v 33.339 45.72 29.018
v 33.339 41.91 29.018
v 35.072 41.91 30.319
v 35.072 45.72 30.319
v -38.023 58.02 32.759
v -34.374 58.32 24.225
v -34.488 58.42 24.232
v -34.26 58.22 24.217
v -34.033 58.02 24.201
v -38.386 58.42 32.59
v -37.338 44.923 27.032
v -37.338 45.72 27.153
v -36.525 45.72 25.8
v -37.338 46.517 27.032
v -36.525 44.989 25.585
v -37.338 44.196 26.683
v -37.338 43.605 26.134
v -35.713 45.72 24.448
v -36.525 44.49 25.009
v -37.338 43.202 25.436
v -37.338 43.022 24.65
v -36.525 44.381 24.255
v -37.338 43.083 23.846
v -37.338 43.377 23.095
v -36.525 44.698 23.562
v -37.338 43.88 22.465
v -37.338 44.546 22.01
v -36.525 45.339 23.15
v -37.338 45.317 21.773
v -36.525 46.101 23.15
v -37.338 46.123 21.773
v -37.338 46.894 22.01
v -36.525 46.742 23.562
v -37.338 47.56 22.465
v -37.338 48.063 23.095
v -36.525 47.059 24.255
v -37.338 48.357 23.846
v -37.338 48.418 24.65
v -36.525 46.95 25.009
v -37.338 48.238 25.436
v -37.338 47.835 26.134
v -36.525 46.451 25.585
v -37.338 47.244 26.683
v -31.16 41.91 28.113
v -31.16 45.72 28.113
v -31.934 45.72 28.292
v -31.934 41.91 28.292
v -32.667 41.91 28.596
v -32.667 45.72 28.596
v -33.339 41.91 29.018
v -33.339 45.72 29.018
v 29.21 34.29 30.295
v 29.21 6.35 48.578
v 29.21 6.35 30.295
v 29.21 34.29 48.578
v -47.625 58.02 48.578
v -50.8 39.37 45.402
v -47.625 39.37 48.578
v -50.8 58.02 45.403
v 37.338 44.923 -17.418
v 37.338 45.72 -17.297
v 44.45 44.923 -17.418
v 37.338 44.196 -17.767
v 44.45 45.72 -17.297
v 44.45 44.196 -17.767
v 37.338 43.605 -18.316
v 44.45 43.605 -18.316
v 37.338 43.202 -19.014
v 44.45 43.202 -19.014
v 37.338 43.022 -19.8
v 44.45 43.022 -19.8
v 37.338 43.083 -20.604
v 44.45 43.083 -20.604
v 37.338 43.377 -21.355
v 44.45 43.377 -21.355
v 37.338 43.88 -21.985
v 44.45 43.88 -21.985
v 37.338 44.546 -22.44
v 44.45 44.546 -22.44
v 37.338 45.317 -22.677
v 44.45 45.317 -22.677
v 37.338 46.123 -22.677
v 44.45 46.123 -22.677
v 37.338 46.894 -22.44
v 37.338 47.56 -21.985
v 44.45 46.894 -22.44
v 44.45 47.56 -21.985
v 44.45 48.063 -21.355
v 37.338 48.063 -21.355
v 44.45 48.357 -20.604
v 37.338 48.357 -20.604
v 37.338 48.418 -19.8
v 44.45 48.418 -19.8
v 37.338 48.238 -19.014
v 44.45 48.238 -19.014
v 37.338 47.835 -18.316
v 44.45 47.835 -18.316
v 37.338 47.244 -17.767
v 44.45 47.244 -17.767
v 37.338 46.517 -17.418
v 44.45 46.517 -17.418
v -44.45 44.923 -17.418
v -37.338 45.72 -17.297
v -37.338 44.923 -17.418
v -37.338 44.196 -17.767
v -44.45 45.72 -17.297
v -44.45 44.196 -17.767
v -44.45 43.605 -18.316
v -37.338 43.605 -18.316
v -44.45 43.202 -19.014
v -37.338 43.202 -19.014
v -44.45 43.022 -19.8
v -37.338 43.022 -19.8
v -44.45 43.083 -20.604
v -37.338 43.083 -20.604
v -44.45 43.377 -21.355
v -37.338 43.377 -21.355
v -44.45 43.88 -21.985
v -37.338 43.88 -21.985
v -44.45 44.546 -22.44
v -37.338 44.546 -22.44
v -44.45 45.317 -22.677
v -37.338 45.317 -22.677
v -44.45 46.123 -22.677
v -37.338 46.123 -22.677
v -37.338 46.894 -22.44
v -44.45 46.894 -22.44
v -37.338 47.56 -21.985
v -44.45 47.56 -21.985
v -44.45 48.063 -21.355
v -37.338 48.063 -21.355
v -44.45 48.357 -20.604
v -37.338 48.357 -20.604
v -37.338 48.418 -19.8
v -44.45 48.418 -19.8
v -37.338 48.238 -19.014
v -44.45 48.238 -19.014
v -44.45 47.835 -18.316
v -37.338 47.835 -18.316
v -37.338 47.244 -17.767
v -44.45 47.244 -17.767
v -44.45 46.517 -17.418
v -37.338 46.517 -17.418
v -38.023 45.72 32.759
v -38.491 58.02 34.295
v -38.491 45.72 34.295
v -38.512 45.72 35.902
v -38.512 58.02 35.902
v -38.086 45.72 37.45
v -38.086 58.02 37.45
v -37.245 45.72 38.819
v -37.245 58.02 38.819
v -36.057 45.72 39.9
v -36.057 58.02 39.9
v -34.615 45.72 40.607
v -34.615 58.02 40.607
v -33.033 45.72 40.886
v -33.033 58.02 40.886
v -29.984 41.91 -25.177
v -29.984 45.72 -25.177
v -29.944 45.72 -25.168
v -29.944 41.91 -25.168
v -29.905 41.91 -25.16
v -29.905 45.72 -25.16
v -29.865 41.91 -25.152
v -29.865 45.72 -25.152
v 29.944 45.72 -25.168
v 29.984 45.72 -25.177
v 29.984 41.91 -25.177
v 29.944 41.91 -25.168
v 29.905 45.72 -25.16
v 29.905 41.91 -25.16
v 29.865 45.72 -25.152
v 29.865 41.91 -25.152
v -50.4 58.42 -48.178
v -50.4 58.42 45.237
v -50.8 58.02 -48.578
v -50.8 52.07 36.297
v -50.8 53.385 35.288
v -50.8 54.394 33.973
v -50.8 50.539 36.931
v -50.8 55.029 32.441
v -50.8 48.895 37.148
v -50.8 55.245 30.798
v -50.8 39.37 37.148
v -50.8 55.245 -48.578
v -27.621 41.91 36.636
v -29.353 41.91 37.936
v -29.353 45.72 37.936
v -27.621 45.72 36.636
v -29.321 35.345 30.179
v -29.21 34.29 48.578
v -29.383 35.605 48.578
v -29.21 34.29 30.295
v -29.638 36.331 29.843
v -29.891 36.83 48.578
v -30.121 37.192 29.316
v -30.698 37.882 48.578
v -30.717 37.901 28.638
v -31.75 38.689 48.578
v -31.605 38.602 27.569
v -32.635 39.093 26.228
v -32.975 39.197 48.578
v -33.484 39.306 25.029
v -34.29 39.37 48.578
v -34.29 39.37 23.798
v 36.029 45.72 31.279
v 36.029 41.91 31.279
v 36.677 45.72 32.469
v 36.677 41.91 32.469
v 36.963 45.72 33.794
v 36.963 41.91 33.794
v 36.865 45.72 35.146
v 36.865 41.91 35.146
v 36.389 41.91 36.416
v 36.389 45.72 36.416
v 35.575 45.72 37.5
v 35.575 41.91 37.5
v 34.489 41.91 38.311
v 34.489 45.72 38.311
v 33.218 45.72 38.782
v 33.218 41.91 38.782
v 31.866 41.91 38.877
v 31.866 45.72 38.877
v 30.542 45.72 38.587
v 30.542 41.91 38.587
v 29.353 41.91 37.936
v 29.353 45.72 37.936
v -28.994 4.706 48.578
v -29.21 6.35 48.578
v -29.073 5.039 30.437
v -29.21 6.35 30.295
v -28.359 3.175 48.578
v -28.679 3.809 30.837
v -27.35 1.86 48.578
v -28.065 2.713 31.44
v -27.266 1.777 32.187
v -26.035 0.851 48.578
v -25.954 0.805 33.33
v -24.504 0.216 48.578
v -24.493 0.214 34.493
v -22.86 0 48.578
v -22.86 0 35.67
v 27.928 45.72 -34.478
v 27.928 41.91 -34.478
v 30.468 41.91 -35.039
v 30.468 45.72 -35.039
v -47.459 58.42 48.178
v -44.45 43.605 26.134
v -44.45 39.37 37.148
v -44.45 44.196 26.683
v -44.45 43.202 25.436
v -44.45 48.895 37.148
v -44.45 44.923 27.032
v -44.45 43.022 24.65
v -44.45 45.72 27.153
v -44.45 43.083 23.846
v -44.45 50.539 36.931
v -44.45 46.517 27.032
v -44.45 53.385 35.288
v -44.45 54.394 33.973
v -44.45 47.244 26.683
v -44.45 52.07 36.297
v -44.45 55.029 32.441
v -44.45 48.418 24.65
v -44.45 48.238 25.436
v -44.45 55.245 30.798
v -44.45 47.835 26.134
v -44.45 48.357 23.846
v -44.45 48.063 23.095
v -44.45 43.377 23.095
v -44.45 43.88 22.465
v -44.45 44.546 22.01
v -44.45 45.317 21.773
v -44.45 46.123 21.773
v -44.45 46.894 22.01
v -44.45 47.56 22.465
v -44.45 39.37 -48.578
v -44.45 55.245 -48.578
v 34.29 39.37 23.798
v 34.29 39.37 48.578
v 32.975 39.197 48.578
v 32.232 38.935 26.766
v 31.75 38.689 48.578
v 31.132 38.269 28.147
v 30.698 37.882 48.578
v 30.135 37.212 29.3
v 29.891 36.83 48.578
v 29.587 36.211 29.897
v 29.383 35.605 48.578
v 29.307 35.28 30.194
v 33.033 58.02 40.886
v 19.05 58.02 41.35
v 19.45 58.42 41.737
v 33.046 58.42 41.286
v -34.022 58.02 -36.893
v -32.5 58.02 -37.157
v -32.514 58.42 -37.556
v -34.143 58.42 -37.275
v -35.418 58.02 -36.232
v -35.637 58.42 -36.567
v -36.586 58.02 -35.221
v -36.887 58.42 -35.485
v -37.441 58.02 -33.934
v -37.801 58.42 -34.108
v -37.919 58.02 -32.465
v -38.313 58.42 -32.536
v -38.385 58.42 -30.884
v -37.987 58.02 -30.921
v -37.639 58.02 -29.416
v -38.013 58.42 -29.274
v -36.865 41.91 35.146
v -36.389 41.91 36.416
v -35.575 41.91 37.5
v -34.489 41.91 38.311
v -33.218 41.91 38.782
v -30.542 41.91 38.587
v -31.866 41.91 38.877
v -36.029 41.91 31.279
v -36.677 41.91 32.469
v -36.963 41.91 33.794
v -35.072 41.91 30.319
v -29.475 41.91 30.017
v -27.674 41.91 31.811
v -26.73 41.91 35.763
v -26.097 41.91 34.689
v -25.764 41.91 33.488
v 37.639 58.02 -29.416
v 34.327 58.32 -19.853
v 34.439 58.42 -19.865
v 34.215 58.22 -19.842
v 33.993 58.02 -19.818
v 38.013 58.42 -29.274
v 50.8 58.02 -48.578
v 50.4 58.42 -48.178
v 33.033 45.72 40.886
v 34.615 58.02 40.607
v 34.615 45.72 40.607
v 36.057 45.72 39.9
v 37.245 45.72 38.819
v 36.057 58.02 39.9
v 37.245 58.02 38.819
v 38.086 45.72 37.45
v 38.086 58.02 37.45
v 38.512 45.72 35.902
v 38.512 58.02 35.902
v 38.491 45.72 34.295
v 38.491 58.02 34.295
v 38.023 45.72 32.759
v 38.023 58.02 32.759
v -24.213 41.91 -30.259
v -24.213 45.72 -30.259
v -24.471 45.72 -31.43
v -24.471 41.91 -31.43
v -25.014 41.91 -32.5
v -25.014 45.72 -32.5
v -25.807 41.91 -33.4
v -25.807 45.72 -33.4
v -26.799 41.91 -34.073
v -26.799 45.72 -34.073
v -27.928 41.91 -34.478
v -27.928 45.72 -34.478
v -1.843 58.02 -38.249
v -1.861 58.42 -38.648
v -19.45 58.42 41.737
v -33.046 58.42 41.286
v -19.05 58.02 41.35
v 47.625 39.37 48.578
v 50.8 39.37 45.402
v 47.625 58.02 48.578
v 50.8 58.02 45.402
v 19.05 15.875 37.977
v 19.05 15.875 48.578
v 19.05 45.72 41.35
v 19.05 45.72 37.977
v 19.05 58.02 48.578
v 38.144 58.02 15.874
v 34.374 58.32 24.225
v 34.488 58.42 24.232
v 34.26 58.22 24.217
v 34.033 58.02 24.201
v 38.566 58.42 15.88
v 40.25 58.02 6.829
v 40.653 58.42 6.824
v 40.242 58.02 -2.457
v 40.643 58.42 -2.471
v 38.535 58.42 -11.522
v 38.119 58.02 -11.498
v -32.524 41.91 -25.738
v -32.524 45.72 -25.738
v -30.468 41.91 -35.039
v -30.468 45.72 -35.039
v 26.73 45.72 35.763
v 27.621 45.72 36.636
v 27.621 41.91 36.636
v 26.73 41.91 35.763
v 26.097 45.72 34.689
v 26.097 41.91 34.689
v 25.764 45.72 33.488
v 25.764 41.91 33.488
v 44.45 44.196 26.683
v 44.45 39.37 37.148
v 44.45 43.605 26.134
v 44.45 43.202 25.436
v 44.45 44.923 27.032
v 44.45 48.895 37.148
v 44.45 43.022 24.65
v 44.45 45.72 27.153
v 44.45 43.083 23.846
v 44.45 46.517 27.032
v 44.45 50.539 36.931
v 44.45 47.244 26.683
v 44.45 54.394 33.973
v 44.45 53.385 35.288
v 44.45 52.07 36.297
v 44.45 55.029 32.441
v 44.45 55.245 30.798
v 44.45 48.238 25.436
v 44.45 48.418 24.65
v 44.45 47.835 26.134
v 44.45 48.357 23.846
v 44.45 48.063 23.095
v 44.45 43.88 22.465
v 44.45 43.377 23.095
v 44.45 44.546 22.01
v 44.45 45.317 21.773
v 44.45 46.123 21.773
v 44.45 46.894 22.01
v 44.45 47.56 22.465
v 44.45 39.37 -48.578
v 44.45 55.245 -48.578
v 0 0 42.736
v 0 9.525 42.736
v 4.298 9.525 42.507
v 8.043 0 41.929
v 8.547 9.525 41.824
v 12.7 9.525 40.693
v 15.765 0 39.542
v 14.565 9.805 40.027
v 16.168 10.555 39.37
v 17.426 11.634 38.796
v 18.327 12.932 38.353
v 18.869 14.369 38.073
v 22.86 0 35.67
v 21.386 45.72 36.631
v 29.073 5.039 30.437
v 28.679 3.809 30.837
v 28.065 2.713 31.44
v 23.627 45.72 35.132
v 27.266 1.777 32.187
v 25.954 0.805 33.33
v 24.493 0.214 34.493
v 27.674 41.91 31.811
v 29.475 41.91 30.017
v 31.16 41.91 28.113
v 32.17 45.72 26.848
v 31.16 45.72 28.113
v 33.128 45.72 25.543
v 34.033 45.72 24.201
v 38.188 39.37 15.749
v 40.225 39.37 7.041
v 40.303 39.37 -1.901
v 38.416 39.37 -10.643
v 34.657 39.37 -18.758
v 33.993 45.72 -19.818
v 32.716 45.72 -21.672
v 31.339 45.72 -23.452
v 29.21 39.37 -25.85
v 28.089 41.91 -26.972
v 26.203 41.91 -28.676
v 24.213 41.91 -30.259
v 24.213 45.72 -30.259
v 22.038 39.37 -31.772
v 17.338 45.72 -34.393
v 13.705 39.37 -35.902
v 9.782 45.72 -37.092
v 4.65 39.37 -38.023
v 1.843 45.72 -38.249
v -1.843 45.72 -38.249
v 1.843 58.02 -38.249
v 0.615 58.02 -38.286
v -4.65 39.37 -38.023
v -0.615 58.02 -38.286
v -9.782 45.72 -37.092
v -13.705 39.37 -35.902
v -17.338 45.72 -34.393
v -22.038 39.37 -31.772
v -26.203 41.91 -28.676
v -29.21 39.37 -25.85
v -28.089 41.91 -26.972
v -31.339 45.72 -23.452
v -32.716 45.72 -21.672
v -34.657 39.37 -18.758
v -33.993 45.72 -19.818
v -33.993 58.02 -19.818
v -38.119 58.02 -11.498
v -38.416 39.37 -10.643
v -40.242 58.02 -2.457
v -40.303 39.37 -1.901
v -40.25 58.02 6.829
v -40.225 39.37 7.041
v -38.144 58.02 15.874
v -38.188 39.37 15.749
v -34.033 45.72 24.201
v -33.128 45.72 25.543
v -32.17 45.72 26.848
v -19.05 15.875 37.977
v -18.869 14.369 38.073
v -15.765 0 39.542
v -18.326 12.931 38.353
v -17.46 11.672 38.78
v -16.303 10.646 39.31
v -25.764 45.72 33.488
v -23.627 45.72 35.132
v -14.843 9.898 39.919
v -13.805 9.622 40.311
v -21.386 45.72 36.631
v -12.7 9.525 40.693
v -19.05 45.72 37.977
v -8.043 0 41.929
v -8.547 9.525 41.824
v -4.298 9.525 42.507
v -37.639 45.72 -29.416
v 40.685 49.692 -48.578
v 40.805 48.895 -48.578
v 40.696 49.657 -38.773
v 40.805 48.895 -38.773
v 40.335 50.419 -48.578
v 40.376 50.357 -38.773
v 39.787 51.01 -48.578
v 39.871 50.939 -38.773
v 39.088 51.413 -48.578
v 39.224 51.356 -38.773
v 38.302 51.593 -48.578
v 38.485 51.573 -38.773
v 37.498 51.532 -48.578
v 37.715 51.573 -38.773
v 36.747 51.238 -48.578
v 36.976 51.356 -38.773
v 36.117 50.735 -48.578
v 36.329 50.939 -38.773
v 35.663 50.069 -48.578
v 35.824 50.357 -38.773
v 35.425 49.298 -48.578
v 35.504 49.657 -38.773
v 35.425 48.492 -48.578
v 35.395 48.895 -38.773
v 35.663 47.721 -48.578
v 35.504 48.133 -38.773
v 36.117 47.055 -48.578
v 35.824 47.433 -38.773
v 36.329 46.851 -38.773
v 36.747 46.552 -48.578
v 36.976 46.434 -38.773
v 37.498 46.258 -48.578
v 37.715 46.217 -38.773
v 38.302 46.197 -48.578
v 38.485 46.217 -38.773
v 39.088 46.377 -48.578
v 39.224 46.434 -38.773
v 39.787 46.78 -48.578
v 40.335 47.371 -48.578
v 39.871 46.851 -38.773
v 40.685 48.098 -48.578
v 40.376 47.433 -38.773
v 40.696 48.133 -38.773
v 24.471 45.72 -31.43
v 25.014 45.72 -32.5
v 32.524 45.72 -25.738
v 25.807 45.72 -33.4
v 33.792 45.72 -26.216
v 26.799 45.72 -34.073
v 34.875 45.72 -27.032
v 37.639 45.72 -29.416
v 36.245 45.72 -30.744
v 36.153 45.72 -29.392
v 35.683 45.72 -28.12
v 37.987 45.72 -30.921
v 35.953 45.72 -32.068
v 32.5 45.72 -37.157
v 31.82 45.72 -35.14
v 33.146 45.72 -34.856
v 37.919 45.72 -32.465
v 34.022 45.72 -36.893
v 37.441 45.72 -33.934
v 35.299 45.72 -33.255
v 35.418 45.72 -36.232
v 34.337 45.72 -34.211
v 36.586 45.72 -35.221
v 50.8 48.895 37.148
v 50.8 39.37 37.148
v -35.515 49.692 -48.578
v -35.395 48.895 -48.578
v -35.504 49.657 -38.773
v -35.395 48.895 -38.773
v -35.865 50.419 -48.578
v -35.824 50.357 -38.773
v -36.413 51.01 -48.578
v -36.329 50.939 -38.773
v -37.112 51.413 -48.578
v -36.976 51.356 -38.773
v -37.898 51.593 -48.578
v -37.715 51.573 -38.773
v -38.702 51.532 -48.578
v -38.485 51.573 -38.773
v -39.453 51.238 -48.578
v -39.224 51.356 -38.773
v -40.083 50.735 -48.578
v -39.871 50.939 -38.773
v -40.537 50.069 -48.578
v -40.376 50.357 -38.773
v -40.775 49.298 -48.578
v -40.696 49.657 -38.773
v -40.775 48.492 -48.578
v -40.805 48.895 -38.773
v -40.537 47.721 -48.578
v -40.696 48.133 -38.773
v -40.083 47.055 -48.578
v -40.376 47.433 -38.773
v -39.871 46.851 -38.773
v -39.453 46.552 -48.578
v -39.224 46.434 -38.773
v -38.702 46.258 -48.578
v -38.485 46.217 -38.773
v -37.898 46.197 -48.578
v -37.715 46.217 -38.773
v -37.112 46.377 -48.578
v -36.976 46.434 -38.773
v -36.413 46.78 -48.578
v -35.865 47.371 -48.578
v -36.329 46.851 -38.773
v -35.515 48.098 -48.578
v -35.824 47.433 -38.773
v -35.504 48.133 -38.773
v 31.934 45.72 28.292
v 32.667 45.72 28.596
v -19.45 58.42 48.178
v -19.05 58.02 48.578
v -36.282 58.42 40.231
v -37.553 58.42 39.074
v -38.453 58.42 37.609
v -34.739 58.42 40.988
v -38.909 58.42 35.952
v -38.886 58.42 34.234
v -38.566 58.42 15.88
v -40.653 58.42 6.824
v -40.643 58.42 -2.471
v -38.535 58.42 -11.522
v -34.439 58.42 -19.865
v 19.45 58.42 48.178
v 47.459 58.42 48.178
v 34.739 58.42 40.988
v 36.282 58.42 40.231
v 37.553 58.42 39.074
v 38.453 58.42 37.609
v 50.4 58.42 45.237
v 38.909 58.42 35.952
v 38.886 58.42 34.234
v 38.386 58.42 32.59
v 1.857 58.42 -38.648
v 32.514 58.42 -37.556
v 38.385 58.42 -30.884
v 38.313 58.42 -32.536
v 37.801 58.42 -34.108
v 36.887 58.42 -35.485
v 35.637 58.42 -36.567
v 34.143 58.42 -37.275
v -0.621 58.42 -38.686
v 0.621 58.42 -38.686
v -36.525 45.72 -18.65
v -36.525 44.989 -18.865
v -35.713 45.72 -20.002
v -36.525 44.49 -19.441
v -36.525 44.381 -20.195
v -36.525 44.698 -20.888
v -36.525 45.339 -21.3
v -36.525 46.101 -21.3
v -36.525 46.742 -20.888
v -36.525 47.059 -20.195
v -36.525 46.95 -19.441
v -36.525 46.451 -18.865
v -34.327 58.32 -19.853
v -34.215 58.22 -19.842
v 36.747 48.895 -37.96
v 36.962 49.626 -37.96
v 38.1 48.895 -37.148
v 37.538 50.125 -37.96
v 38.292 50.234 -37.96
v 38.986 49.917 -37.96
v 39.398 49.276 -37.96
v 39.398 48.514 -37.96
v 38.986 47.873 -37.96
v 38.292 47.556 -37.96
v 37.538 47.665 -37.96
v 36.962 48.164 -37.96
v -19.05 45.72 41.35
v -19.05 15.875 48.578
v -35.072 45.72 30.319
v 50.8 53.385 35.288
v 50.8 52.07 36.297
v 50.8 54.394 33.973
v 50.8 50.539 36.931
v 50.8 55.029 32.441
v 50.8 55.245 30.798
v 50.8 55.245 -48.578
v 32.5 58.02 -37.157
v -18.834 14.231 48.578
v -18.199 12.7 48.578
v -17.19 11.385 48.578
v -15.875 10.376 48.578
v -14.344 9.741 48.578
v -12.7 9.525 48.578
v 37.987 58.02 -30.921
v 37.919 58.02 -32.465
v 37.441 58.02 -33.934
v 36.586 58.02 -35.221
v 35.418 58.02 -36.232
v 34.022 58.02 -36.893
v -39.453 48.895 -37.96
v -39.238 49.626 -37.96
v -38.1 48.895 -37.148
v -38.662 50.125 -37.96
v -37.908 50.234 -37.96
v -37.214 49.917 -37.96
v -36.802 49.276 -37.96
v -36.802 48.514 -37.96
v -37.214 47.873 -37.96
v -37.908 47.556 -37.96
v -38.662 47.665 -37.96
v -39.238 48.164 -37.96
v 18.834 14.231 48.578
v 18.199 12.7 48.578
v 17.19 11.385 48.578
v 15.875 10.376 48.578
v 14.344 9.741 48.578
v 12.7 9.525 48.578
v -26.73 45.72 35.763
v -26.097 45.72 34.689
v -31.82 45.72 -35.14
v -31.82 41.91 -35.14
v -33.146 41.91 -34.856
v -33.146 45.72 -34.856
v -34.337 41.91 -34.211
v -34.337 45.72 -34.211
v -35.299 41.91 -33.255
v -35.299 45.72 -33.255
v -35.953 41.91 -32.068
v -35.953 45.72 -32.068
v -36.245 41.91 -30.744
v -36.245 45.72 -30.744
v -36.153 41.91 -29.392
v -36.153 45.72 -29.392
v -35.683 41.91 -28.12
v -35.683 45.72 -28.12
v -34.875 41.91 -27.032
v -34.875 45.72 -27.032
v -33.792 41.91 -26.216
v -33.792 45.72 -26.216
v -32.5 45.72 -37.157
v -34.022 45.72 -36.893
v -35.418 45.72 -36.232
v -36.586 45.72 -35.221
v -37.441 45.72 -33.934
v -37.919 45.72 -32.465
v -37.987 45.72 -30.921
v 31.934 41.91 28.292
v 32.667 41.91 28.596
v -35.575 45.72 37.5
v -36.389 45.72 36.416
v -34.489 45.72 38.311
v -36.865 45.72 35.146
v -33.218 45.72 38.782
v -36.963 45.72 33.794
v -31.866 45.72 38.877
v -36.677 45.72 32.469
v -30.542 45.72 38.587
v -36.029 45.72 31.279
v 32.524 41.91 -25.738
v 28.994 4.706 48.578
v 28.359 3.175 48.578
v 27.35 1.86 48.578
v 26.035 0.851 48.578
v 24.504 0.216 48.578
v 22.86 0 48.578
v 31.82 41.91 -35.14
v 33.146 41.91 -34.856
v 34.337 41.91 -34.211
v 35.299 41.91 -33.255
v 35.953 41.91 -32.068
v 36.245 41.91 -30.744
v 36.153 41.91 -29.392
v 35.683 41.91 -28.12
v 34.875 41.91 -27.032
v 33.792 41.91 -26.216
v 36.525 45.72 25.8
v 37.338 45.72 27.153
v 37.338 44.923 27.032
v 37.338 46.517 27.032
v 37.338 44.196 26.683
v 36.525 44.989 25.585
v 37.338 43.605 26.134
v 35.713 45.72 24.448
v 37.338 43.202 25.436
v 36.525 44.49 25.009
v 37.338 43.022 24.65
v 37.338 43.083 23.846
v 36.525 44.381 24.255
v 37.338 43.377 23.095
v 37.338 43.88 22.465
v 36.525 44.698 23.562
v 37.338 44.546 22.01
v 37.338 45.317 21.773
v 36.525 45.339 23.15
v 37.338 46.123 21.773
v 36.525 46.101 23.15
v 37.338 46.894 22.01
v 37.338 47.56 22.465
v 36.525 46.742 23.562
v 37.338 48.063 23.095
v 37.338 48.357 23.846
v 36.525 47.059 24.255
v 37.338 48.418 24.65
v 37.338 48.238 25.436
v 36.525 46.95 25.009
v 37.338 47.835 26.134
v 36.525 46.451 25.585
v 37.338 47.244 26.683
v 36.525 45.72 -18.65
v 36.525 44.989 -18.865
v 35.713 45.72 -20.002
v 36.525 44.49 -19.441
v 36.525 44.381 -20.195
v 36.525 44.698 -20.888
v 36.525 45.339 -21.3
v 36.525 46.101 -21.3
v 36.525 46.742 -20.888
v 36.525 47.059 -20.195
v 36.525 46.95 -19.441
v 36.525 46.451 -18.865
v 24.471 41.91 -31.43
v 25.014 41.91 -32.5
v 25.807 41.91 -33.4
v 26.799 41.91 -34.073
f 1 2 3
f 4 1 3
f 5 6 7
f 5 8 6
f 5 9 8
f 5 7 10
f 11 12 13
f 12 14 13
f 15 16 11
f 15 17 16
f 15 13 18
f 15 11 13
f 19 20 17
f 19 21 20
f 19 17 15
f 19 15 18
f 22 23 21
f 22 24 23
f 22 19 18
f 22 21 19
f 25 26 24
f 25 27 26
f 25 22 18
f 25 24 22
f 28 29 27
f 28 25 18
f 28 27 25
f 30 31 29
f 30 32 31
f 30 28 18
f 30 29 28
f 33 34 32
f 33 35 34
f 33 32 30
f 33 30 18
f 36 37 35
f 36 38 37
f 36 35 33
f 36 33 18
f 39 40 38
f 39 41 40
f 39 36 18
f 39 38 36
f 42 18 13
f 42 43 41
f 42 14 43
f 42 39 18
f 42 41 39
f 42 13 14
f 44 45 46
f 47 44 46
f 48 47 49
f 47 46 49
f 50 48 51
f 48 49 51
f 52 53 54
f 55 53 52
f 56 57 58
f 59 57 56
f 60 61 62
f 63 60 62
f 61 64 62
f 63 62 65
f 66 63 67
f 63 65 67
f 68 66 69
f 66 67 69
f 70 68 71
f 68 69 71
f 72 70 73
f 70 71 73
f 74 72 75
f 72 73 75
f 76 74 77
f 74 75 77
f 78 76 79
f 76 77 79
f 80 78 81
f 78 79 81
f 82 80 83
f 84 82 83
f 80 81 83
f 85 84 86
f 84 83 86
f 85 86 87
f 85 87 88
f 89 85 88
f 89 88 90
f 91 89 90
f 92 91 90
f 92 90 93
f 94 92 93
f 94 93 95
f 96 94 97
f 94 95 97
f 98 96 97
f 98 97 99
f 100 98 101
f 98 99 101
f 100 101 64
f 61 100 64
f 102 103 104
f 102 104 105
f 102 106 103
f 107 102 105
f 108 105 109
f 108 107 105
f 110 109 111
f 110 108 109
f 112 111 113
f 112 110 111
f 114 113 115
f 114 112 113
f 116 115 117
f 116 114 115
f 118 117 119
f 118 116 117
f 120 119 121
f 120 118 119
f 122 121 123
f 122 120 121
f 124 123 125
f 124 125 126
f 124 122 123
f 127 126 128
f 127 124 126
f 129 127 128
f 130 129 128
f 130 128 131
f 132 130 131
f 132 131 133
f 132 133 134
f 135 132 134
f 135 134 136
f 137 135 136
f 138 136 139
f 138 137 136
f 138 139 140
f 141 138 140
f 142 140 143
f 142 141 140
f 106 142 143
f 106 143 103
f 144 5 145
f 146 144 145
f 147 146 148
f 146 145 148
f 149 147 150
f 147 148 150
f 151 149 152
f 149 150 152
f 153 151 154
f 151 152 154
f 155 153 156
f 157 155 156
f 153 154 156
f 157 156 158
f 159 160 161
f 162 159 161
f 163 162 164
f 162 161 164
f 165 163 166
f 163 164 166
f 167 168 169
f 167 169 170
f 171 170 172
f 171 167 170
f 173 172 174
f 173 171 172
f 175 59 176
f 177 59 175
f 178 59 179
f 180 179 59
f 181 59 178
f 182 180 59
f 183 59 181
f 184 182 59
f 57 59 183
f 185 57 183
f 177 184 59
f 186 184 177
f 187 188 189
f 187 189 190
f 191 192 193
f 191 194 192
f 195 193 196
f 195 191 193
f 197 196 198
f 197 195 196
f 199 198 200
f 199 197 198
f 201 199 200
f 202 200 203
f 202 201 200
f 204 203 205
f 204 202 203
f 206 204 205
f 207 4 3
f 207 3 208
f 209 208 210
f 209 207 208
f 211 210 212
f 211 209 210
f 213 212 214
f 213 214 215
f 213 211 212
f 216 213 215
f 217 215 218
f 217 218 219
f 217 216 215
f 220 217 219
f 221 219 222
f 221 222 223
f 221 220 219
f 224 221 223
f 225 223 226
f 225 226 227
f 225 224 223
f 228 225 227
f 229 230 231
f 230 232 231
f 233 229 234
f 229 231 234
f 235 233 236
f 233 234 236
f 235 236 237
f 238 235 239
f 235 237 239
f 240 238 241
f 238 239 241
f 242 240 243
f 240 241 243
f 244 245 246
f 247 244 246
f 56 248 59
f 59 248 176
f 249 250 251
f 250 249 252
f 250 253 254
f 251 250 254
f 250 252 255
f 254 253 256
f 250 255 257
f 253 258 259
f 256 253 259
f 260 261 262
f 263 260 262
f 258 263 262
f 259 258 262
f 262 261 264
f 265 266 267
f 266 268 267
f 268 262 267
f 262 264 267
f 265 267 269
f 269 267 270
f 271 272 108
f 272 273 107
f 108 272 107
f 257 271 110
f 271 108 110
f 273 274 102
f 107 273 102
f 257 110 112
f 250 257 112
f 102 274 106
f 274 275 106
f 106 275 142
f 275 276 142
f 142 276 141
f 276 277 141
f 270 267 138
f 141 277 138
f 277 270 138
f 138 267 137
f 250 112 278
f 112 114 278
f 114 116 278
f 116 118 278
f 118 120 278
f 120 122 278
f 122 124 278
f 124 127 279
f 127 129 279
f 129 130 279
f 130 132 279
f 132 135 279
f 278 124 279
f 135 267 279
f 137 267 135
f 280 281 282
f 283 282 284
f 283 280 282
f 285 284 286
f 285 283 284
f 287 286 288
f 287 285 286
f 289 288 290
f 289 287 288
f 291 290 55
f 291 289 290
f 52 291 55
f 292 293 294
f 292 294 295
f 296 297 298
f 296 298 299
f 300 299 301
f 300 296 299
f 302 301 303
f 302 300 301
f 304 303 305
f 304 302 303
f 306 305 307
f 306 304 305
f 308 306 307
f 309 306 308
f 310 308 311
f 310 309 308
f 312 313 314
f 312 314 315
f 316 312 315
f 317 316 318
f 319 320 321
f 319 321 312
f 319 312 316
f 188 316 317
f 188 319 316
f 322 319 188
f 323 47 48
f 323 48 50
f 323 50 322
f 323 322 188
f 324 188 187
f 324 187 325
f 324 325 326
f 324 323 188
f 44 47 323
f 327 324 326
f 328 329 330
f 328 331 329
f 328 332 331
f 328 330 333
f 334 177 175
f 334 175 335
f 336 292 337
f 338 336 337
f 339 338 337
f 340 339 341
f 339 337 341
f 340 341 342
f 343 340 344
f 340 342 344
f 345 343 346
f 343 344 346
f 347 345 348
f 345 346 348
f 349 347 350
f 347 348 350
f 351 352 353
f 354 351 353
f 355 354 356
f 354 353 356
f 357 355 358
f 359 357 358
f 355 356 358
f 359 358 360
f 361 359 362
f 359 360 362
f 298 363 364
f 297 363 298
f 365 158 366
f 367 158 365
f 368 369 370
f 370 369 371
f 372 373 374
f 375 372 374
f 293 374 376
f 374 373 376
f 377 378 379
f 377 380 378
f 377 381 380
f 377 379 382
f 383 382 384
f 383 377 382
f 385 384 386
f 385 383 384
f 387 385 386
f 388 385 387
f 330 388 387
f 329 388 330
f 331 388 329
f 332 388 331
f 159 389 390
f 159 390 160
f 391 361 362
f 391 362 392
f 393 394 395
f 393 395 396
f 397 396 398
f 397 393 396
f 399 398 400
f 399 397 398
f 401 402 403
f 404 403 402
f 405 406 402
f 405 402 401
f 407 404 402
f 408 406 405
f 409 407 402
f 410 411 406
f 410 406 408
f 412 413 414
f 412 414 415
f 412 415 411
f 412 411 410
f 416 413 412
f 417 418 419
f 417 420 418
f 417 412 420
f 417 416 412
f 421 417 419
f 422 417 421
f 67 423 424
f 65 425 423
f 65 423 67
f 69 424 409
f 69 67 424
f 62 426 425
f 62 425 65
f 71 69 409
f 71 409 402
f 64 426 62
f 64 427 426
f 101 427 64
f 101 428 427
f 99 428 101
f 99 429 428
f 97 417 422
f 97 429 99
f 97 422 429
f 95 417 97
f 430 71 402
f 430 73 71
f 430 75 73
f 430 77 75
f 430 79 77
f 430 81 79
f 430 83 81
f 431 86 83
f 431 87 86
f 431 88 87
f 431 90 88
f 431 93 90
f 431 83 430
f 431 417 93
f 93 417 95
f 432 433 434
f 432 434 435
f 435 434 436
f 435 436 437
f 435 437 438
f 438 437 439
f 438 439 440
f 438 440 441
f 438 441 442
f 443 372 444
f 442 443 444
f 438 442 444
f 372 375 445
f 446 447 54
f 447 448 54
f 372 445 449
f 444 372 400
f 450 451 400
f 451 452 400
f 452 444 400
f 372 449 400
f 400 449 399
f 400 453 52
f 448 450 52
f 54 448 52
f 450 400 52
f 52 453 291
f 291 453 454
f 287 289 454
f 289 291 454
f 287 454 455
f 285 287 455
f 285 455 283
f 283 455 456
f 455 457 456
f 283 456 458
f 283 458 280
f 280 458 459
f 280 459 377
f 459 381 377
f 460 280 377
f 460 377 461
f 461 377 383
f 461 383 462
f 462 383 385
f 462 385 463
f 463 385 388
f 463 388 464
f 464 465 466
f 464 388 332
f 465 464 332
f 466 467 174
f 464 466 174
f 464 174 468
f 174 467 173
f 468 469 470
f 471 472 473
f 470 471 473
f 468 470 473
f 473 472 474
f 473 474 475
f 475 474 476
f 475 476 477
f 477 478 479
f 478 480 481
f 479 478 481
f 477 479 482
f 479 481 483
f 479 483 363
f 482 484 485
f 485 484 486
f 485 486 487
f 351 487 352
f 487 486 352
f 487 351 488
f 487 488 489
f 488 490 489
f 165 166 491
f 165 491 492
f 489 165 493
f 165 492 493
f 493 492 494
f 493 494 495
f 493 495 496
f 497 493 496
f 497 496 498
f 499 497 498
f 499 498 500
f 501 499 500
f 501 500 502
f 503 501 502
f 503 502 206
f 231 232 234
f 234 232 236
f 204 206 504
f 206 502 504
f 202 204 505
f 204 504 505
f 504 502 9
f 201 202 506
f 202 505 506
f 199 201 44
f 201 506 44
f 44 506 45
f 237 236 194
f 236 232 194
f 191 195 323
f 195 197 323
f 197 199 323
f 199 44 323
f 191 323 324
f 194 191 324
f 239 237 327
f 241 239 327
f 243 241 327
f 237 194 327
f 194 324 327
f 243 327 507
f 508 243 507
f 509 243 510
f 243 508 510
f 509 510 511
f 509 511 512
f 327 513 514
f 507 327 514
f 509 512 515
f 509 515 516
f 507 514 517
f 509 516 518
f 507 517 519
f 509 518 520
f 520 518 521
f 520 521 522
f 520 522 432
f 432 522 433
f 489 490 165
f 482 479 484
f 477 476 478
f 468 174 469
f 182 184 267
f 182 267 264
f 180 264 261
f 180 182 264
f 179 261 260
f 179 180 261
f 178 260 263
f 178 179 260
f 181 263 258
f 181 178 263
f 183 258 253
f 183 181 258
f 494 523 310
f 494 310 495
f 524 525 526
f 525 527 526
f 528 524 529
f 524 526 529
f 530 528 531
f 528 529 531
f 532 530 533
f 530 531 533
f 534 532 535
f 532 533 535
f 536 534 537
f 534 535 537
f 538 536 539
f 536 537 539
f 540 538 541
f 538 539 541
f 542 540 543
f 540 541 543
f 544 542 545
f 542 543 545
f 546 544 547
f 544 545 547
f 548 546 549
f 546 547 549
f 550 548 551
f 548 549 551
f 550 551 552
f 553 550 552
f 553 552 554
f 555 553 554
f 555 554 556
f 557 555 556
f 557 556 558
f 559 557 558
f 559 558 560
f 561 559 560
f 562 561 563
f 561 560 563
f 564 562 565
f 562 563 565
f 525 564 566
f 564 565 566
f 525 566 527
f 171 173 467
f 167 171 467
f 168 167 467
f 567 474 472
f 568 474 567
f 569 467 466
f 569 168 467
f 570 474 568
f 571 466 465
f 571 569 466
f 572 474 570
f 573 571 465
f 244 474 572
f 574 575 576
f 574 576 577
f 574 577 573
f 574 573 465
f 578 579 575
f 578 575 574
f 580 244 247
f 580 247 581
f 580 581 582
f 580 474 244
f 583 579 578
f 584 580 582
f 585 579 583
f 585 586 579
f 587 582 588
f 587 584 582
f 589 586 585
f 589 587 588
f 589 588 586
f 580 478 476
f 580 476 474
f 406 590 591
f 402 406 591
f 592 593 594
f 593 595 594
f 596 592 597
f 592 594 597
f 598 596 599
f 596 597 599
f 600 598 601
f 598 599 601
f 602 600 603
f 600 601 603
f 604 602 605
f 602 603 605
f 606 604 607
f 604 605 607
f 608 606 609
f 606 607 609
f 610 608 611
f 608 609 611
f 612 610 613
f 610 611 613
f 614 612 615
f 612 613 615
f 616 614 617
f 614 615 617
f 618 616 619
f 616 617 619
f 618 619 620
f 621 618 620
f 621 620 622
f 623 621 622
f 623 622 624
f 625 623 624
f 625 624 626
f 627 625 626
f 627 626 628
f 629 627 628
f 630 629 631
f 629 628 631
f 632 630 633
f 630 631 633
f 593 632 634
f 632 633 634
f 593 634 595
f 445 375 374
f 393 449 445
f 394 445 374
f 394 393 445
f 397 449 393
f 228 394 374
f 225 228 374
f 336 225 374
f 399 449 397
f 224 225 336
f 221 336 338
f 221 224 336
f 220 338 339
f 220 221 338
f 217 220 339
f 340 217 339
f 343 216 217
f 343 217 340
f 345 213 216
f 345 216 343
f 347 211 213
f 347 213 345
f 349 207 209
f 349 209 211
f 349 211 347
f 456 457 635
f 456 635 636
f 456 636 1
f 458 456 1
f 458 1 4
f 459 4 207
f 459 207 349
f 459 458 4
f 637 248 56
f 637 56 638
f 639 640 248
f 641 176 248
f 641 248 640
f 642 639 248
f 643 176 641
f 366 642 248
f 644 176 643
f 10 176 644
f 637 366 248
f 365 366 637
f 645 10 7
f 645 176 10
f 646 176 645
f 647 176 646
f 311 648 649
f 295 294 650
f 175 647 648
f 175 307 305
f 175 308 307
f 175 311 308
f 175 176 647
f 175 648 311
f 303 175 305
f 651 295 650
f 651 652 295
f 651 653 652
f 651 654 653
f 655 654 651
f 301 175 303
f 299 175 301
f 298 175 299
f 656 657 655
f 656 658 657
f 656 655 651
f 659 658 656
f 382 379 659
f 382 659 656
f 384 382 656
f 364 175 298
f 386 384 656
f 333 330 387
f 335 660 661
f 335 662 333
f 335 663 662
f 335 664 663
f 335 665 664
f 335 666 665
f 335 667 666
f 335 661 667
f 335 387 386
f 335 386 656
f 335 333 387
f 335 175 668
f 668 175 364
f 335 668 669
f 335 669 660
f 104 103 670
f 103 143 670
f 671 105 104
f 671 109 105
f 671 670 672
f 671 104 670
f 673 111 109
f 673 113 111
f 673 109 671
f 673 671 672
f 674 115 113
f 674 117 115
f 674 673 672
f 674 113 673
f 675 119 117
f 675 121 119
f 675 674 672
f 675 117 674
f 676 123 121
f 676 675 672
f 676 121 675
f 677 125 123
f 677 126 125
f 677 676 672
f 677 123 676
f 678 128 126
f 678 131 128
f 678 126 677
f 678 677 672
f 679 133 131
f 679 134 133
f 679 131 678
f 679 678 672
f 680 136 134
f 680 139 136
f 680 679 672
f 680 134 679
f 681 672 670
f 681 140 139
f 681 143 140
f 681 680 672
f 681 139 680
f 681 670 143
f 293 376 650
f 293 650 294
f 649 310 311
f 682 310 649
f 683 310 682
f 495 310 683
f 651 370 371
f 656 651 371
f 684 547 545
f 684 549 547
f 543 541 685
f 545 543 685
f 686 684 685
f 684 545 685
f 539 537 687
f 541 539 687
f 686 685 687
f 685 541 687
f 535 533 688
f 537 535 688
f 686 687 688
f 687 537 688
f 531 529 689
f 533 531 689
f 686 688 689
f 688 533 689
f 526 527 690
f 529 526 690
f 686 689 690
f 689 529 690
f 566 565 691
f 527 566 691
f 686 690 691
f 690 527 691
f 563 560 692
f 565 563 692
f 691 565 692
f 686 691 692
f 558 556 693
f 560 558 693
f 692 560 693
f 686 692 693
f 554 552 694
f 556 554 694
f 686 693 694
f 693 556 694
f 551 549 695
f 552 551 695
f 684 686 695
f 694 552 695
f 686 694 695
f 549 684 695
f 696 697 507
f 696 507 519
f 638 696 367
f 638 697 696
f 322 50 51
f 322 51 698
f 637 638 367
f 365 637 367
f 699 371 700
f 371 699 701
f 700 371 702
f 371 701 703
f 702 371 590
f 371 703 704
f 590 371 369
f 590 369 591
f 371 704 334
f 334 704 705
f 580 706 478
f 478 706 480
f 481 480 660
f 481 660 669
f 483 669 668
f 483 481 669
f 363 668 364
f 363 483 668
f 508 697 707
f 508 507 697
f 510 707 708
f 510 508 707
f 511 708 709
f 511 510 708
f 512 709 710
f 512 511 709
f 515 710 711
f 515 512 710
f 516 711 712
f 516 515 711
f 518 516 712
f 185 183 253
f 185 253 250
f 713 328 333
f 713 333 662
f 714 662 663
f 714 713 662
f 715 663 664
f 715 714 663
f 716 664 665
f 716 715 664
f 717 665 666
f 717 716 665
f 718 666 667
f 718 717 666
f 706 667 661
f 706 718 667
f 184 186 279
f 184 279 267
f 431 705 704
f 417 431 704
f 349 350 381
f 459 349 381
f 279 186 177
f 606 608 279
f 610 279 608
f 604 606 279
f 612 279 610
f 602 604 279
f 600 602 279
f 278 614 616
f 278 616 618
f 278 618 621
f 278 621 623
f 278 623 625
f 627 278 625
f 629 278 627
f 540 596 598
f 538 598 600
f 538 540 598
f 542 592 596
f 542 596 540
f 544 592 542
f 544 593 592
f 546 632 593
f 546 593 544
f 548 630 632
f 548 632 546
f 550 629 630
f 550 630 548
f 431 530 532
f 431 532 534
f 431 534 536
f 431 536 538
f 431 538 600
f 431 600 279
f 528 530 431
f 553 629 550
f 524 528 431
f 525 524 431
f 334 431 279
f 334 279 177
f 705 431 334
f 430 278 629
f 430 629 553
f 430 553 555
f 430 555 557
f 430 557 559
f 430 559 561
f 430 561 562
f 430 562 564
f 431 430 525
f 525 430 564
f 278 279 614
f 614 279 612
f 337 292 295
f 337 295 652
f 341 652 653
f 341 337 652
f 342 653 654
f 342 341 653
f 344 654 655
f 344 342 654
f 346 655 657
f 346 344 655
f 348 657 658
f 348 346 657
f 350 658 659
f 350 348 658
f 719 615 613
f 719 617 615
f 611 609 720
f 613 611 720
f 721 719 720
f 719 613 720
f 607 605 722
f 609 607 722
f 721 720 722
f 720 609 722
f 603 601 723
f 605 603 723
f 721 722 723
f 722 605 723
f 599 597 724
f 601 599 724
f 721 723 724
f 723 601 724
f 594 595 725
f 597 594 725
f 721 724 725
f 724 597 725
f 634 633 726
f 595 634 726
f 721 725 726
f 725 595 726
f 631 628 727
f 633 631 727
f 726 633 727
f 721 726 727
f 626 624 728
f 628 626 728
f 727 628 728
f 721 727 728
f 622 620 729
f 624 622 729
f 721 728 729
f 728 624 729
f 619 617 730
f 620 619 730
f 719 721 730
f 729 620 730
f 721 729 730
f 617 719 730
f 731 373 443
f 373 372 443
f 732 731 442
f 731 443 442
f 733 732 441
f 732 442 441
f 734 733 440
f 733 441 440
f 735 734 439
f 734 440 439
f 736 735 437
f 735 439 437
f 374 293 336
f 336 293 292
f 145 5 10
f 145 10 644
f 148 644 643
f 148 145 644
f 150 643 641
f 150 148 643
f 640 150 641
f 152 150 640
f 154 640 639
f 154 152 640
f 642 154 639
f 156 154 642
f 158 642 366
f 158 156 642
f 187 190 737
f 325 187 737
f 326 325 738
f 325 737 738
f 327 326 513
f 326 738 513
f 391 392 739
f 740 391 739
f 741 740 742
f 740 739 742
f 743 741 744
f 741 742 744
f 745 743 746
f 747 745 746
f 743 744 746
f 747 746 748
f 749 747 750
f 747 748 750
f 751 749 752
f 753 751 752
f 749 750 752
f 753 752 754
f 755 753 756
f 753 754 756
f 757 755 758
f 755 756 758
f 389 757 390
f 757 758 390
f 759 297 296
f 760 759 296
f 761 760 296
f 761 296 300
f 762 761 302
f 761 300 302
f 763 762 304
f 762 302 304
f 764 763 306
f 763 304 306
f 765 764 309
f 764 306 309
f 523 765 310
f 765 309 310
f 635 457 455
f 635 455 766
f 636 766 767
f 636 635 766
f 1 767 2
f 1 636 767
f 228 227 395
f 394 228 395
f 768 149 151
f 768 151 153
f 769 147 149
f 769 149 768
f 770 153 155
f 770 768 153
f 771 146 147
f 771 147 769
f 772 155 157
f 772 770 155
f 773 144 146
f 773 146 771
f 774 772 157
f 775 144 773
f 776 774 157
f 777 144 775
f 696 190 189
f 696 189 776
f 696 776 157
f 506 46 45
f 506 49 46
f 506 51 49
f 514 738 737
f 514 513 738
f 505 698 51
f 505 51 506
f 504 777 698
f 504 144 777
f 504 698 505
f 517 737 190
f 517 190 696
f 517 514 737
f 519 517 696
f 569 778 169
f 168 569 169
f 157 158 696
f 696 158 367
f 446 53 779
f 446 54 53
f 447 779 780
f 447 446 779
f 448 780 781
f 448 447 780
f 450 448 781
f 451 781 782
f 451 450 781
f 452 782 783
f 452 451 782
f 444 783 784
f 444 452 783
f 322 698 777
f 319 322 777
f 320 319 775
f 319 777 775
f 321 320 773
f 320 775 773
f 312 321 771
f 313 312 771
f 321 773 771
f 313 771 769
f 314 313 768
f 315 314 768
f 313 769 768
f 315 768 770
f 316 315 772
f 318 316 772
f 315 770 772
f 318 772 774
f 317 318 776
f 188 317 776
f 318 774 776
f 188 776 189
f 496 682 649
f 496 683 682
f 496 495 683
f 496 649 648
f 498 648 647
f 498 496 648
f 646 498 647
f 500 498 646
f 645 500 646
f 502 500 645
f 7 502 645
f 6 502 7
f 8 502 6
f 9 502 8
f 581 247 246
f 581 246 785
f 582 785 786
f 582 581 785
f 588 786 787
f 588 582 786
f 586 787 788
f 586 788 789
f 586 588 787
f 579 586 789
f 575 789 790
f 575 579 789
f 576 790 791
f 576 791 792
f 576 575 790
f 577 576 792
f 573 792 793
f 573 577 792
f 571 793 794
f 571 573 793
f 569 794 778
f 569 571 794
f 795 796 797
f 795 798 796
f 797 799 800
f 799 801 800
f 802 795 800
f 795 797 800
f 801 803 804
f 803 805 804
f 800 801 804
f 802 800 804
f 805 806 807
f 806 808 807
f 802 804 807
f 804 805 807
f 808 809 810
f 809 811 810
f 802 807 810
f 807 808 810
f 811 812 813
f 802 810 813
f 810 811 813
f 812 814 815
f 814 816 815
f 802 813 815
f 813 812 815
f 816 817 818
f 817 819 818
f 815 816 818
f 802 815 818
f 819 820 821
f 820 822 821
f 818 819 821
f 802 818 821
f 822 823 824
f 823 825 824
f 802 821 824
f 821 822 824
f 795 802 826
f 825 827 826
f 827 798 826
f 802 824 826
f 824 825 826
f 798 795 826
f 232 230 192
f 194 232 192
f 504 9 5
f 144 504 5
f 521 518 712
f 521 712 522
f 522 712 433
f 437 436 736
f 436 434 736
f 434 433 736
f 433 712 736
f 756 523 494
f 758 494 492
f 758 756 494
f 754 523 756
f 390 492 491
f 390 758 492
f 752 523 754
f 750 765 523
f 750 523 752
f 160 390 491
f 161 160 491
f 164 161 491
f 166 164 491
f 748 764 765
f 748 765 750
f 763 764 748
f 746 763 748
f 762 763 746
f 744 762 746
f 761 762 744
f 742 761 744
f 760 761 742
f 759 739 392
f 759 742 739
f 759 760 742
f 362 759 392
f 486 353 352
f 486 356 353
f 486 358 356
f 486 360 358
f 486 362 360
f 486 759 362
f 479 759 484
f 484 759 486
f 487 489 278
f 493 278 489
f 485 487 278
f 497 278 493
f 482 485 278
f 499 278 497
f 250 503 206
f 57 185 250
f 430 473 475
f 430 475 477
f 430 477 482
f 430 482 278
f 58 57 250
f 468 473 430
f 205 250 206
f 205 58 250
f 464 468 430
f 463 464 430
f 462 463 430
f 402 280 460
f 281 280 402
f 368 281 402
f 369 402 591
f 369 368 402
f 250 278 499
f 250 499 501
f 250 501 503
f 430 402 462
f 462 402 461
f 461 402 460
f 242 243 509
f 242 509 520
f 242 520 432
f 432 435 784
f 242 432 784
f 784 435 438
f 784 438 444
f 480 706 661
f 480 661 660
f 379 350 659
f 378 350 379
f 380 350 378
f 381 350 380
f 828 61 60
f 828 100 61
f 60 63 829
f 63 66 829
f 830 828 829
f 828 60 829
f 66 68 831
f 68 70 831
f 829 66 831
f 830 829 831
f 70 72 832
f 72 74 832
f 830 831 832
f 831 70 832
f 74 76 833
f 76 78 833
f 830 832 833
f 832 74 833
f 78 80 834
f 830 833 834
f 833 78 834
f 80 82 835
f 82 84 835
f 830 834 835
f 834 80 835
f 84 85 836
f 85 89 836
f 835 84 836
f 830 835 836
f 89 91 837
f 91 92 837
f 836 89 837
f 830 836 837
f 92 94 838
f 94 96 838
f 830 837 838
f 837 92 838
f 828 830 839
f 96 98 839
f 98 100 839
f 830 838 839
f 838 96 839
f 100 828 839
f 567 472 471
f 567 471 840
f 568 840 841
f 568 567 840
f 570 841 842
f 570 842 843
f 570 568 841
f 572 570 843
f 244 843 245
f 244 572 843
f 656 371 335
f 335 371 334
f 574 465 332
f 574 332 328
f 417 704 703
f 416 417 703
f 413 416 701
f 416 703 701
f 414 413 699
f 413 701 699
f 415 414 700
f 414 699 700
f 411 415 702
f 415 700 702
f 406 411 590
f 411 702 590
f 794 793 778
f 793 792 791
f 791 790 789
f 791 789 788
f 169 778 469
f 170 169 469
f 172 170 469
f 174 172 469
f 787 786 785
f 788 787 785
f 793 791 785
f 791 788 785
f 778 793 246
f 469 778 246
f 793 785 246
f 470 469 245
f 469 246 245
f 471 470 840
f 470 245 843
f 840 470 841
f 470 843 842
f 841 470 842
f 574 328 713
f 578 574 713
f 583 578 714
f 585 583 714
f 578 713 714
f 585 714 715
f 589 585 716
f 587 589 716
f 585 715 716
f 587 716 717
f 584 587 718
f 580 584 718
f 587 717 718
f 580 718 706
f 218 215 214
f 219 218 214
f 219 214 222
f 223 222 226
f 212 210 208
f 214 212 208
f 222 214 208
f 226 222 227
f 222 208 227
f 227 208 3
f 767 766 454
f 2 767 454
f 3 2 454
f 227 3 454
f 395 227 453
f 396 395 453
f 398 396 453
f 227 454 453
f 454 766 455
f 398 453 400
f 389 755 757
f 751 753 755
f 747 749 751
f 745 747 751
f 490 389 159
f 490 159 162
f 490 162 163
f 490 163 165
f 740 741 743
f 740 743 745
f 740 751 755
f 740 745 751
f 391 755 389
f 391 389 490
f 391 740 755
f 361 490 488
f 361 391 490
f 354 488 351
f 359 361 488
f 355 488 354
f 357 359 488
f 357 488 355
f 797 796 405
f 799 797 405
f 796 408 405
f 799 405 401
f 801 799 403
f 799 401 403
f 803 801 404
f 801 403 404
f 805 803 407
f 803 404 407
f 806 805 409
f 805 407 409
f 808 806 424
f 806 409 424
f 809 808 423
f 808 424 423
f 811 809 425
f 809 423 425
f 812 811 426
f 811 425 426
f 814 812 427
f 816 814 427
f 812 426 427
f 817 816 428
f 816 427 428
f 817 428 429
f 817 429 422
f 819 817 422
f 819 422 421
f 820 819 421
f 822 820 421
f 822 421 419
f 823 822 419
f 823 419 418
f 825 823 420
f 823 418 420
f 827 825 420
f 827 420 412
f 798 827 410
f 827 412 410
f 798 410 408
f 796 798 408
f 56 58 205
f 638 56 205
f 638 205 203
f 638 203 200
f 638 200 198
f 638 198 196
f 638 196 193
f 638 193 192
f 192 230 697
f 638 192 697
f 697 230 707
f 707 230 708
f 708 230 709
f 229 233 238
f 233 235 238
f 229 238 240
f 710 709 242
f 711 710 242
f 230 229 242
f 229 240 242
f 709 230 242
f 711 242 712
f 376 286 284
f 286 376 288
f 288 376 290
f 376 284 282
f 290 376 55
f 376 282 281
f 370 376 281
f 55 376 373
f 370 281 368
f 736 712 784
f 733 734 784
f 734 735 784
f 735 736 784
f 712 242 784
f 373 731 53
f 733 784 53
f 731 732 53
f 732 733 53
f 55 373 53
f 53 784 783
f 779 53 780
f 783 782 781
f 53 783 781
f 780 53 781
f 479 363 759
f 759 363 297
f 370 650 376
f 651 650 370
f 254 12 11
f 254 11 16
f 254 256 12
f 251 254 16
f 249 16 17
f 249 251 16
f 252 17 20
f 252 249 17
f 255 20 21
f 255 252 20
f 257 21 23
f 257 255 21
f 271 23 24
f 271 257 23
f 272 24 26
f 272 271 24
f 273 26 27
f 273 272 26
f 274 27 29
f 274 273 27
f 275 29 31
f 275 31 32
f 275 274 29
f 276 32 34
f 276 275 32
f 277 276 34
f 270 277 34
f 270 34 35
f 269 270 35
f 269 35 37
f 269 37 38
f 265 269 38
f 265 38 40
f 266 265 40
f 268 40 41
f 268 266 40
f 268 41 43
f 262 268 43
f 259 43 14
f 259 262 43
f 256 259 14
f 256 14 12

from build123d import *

# Parameters (mm, degrees)
SKETCH1_W                            = 101.6
SKETCH1_H                            = 97.155
BOSS_EXTRUDE1_DEPTH                  = 58.42
SKETCH2_W                            = 21.59
SKETCH2_H                            = 39.37
CUT_EXTRUDE1_DEPTH                   = 125.22813862
SKETCH3_R                            = 40.513
CUT_EXTRUDE2_DEPTH                   = 92.396443619
CUT_EXTRUDE3_START                   = -39.37
CUT_EXTRUDE3_DEPTH                   = 39.37
CUT_EXTRUDE4_REACH                   = 126.228
CUT_EXTRUDE4_END_RADIUS              = 40.513
SKETCH5_W                            = 38.1
SKETCH5_H                            = 48.895
FILLET1_R                            = 6.35
FILLET2_R                            = 5.08
CHAMFER1_SIZE                        = 3.175
CUT_EXTRUDE5_DEPTH                   = 6.35
TAP_DRILL_FOR_1_4_28_TAP1_AT_2_COUNT = 2
TAP_DRILL_FOR_1_4_28_TAP1_AT_2_PITCH = 44.45
TAP_DRILL_FOR_1_4_28_TAP2_D          = 5.4102
TAP_DRILL_FOR_1_4_28_TAP2_DEPTH      = 9.804611939
TAP_DRILL_FOR_1_4_28_TAP2_TIP        = 1.625388061
SKETCH12_R                           = 5.715
CUT_EXTRUDE6_DEPTH                   = 12.7
SKETCH13_R                           = 40.513
CUT_EXTRUDE7_DEPTH                   = 3.81
CHAMFER2_SIZE                        = 0.4


with BuildPart() as part:
    # Sketch1 → Boss-Extrude1 (new body)
    with BuildSketch(Plane(origin=(0, 0, 0), x_dir=(1, 0, 0), z_dir=(0, 1, 0))):
        Rectangle(SKETCH1_W, SKETCH1_H)
    extrude(amount=BOSS_EXTRUDE1_DEPTH)

    # Sketch2 → Cut-Extrude1 (cut, through all)
    with BuildSketch(Plane.XY.offset(48.5775)):
        with Locations((-40.005, 19.685)):
            Rectangle(SKETCH2_W, SKETCH2_H)
        with Locations((40.005, 19.685)):
            Rectangle(SKETCH2_W, SKETCH2_H)
    extrude(amount=-CUT_EXTRUDE1_DEPTH, mode=Mode.SUBTRACT)

    # Sketch3 → Cut-Extrude2 (cut, through all)
    with BuildSketch(Plane(origin=(0, 58.42, 0), x_dir=(1, 0, 0), z_dir=(0, 1, 0))):
        with Locations(Location((0, -2.2225, 0), (0, 0, 270))):
            Circle(SKETCH3_R)
    extrude(amount=-CUT_EXTRUDE2_DEPTH, mode=Mode.SUBTRACT)

    # Sketch4 → Cut-Extrude3 (cut)
    with BuildSketch(Plane.XZ.offset(CUT_EXTRUDE3_START)):
        with BuildLine():
            Line((-29.21, -25.850246018), (-29.21, -48.5775))
            Line((-29.21, -48.5775), (29.21, -48.5775))
            Line((29.21, -48.5775), (29.21, -25.850246018))
            ThreePointArc((29.21, -25.850246018), (0, -38.2905), (-29.21, -25.850246018))
        make_face()
    extrude(amount=CUT_EXTRUDE3_DEPTH, mode=Mode.SUBTRACT)

    # Cut-Extrude4: up to this cylinder (the profile starts outside it)
    cut_extrude4_end = Plane(origin=(0, 33.9725, 2.2225), z_dir=(0, 1, 0)) * Cylinder(CUT_EXTRUDE4_END_RADIUS, 334.482, mode=Mode.PRIVATE)
    # Sketch5 → Cut-Extrude4 (cut, up to the surface)
    with BuildSketch(Plane.XY.offset(48.5775), mode=Mode.PRIVATE) as cut_extrude4_sk1:
        with Locations((0, 33.9725)):
            Rectangle(SKETCH5_W, SKETCH5_H)
    cut_extrude4_tool1 = extrude(cut_extrude4_sk1.sketch, amount=-CUT_EXTRUDE4_REACH, mode=Mode.PRIVATE) - cut_extrude4_end
    add(cut_extrude4_tool1.solids().sort_by_distance((0, 33.9725, 48.5775))[0], mode=Mode.SUBTRACT)

    # Fillet1
    fillet1_edges = [part.edges().sort_by_distance(p)[0] for p in [
        (-29.21, 0, 39.436373009),
        (29.21, 0, 39.436373009),
        (-19.05, 9.525, 43.277364662),
        (19.05, 9.525, 43.277364662),
    ]]
    fillet(fillet1_edges, radius=FILLET1_R)

    # Fillet2
    fillet2_edges = [part.edges().sort_by_distance(p)[0] for p in [
        (-29.21, 39.37, 39.436373009),
        (29.21, 39.37, 39.436373009),
    ]]
    fillet(fillet2_edges, radius=FILLET2_R)

    # Chamfer1
    chamfer1_edges = [part.edges().sort_by_distance(p)[0] for p in [
        (50.8, 48.895, 48.5775),
        (-50.8, 48.895, 48.5775),
    ]]
    chamfer(chamfer1_edges, length=CHAMFER1_SIZE)

    # Sketch6 → Cut-Extrude5 (cut)
    with BuildSketch(Plane.ZY.offset(50.8)):
        with BuildLine():
            Line((-48.5775, 55.245), (30.7975, 55.245))
            ThreePointArc((30.7975, 55.245), (35.287628061, 53.385128061), (37.1475, 48.895))
            Line((37.1475, 48.895), (37.1475, 39.37))
            Line((37.1475, 39.37), (-48.5775, 39.37))
            Line((-48.5775, 39.37), (-48.5775, 55.245))
        make_face()
    cut_extrude5 = extrude(amount=-CUT_EXTRUDE5_DEPTH, mode=Mode.SUBTRACT)

    # Sketch8 → Tap Drill for 1/4-28 Tap1 (revolve, cut)
    with BuildSketch(Plane(origin=(-44.45, 45.72, -20.0025), x_dir=(0, 0, 1), z_dir=(0, 1, 0))):
        Polygon((0, 0), (0, 8.737388061), (2.7051, 7.112), (2.7051, 0), align=None)
    tap_drill_for_1_4_28_tap1 = revolve(axis=Axis((-50.8, 45.72, -20.0025), (1, 0, 0)), mode=Mode.SUBTRACT)

    # Tap Drill for 1/4-28 Tap1 at 2: Tap Drill for 1/4-28 Tap1 ×2
    with Locations(*[(0, 0, i * TAP_DRILL_FOR_1_4_28_TAP1_AT_2_PITCH) for i in range(1, TAP_DRILL_FOR_1_4_28_TAP1_AT_2_COUNT)]):
        add(tap_drill_for_1_4_28_tap1, mode=Mode.SUBTRACT)

    # Tap Drill for 1/4-28 Tap2
    with Locations(Plane(origin=(38.1, 48.895, -48.5775), x_dir=(-1, 0, 0), z_dir=(0, 0, -1))):
        with Locations((0, 0), (76.2, 0)):
            Hole(TAP_DRILL_FOR_1_4_28_TAP2_D / 2, depth=TAP_DRILL_FOR_1_4_28_TAP2_DEPTH)
            with Locations((0, 0, -(TAP_DRILL_FOR_1_4_28_TAP2_DEPTH + TAP_DRILL_FOR_1_4_28_TAP2_TIP / 2))):  # 118° drill point
                Cone(0, TAP_DRILL_FOR_1_4_28_TAP2_D / 2, TAP_DRILL_FOR_1_4_28_TAP2_TIP, mode=Mode.SUBTRACT)

    # Sketch12 → Cut-Extrude6 (cut)
    with BuildSketch(Plane(origin=(0, 58.42, 0), x_dir=(1, 0, 0), z_dir=(0, 1, 0))):
        with Locations((-32.2961, 31.4452)):
            Circle(SKETCH12_R)
        with BuildLine():
            ThreePointArc((-33.992836913, 19.818148984), (-20.14878741, 32.924755012), (-1.84310515, 38.248553018))
            Line((-1.84310515, 38.248553018), (-32.499537967, 37.156577942))
            ThreePointArc((-32.499537967, 37.156577942), (-28.327562674, 35.55761249), (-26.5811, 31.4452))
            ThreePointArc((-26.5811, 31.4452), (-31.264433085, 25.824089044), (-37.638628741, 29.41576371))
            Line((-37.638628741, 29.41576371), (-33.992836913, 19.818148984))
        make_face()
        with BuildLine():
            Line((32.499537967, 37.156577942), (1.84310515, 38.248553018))
            ThreePointArc((1.84310515, 38.248553018), (20.14878741, 32.924755012), (33.992836913, 19.818148984))
            Line((33.992836913, 19.818148984), (37.638628741, 29.41576371))
            ThreePointArc((37.638628741, 29.41576371), (27.534851432, 28.284229093), (32.499537967, 37.156577942))
        make_face()
        with Locations((32.2961, 31.4452)):
            Circle(SKETCH12_R)
        with Locations((32.84347, -35.17392)):
            Circle(SKETCH12_R)
        with BuildLine():
            Line((38.023019003, -32.758656634), (34.032742491, -24.20148104))
            ThreePointArc((34.032742491, -24.20148104), (27.420561588, -32.045577829), (19.05, -37.977229324))
            Line((19.05, -37.977229324), (19.05, -41.349640271))
            Line((19.05, -41.349640271), (33.032951844, -40.885777984))
            ThreePointArc((33.032951844, -40.885777984), (27.973239162, -32.183589486), (38.023019003, -32.758656634))
        make_face()
        with BuildLine():
            ThreePointArc((-19.05, -37.977229324), (-27.420561588, -32.045577829), (-34.032742491, -24.20148104))
            Line((-34.032742491, -24.20148104), (-38.023019003, -32.758656634))
            ThreePointArc((-38.023019003, -32.758656634), (-31.606517606, -29.594388319), (-27.12847, -35.17392))
            ThreePointArc((-27.12847, -35.17392), (-28.869911377, -39.281480939), (-33.032951844, -40.885777984))
            Line((-33.032951844, -40.885777984), (-19.05, -41.349640271))
            Line((-19.05, -41.349640271), (-19.05, -37.977229324))
        make_face()
        with Locations((-32.84347, -35.17392)):
            Circle(SKETCH12_R)
    extrude(amount=-CUT_EXTRUDE6_DEPTH, mode=Mode.SUBTRACT)

    # Sketch13 → Cut-Extrude7 (cut)
    with BuildSketch(Plane(origin=(0, 45.72, 0), x_dir=(1, 0, 0), z_dir=(0, 1, 0))):
        with BuildLine():
            Line((-27.928285617, 34.477511324), (-30.468285617, 35.038851324))
            ThreePointArc((-30.468285617, 35.038851324), (-36.146291324, 31.416274383), (-32.523714383, 25.738268676))
            Line((-32.523714383, 25.738268676), (-29.983714383, 25.176928676))
            ThreePointArc((-29.983714383, 25.176928676), (-29.924483296, 25.164233151), (-29.865095524, 25.152292024))
            ThreePointArc((-29.865095524, 25.152292024), (-27.159369973, 27.838634238), (-24.213087874, 30.258718336))
            ThreePointArc((-24.213087874, 30.258718336), (-25.381844695, 32.974730144), (-27.928285617, 34.477511324))
        make_face()
        with Locations(Location((0, -2.2225, 0), (0, 0, 288.269054449))):
            Circle(SKETCH13_R)
        with BuildLine():
            ThreePointArc((-27.62071326, -36.63561929), (-26.67134071, -29.96767326), (-33.33928674, -29.01830071))
            Line((-33.33928674, -29.01830071), (-35.07156674, -30.31878071))
            ThreePointArc((-35.07156674, -30.31878071), (-36.02093929, -36.98672674), (-29.35299326, -37.93609929))
            Line((-29.35299326, -37.93609929), (-27.62071326, -36.63561929))
        make_face()
    cut_extrude7 = extrude(amount=-CUT_EXTRUDE7_DEPTH, mode=Mode.SUBTRACT)

    # Mirror1: Cut-Extrude5, Tap Drill for 1/4-28 Tap1, Cut-Extrude7 across plane
    add(cut_extrude5.mirror(Plane(origin=(0, 0, 0), x_dir=(0, 0, 1), z_dir=(1, 0, 0))), mode=Mode.SUBTRACT)
    add(tap_drill_for_1_4_28_tap1.mirror(Plane(origin=(0, 0, 0), x_dir=(0, 0, 1), z_dir=(1, 0, 0))), mode=Mode.SUBTRACT)
    add(cut_extrude7.mirror(Plane(origin=(0, 0, 0), x_dir=(0, 0, 1), z_dir=(1, 0, 0))), mode=Mode.SUBTRACT)

    # Mirror1 copy 1 sketch → Mirror1 copy 1 (revolve, cut)
    with BuildSketch(Plane(origin=(44.45, 45.72, 24.4475), x_dir=(0, 0, 1), z_dir=(0, 1, 0))):
        Polygon((0, 0), (0, -8.737388061), (2.7051, -7.112), (2.7051, 0), align=None)
    revolve(axis=Axis((50.8, 45.72, 24.4475), (1, 0, 0)), mode=Mode.SUBTRACT)

    # Chamfer2
    chamfer2_edges = [part.edges().sort_by_distance(p)[0] for p in [
        (50.8, 58.42, -1.5875),
        (-33.3375, 58.42, 48.5775),
        (-49.2125, 58.42, 46.99),
        (49.2125, 58.42, 46.99),
        (0, 58.42, -48.5775),
        (19.05, 58.42, 44.963570135),
        (-19.05, 58.42, 44.963570135),
        (40.512983353, 58.42, 2.185773339),
        (0, 58.42, -38.2905),
        (-40.512983353, 58.42, 2.185773339),
        (-36.027880747, 58.42, 28.480068837),
        (-37.713700838, 58.42, 38.164250514),
        (-26.041475922, 58.42, 41.117709128),
        (37.713700838, 58.42, 38.164250514),
        (36.027880747, 58.42, 28.480068837),
        (26.041475922, 58.42, 41.117709128),
        (17.171321559, 58.42, -37.70256548),
        (35.815732827, 58.42, -24.616956347),
        (37.057348568, 58.42, -34.606170907),
        (-35.815732827, 58.42, -24.616956347),
        (-37.057348568, 58.42, -34.606170907),
        (-17.171321559, 58.42, -37.70256548),
        (-50.8, 58.42, -1.5875),
        (33.3375, 58.42, 48.5775),
    ]]
    chamfer(chamfer2_edges, length=CHAMFER2_SIZE)


solid = part.part
